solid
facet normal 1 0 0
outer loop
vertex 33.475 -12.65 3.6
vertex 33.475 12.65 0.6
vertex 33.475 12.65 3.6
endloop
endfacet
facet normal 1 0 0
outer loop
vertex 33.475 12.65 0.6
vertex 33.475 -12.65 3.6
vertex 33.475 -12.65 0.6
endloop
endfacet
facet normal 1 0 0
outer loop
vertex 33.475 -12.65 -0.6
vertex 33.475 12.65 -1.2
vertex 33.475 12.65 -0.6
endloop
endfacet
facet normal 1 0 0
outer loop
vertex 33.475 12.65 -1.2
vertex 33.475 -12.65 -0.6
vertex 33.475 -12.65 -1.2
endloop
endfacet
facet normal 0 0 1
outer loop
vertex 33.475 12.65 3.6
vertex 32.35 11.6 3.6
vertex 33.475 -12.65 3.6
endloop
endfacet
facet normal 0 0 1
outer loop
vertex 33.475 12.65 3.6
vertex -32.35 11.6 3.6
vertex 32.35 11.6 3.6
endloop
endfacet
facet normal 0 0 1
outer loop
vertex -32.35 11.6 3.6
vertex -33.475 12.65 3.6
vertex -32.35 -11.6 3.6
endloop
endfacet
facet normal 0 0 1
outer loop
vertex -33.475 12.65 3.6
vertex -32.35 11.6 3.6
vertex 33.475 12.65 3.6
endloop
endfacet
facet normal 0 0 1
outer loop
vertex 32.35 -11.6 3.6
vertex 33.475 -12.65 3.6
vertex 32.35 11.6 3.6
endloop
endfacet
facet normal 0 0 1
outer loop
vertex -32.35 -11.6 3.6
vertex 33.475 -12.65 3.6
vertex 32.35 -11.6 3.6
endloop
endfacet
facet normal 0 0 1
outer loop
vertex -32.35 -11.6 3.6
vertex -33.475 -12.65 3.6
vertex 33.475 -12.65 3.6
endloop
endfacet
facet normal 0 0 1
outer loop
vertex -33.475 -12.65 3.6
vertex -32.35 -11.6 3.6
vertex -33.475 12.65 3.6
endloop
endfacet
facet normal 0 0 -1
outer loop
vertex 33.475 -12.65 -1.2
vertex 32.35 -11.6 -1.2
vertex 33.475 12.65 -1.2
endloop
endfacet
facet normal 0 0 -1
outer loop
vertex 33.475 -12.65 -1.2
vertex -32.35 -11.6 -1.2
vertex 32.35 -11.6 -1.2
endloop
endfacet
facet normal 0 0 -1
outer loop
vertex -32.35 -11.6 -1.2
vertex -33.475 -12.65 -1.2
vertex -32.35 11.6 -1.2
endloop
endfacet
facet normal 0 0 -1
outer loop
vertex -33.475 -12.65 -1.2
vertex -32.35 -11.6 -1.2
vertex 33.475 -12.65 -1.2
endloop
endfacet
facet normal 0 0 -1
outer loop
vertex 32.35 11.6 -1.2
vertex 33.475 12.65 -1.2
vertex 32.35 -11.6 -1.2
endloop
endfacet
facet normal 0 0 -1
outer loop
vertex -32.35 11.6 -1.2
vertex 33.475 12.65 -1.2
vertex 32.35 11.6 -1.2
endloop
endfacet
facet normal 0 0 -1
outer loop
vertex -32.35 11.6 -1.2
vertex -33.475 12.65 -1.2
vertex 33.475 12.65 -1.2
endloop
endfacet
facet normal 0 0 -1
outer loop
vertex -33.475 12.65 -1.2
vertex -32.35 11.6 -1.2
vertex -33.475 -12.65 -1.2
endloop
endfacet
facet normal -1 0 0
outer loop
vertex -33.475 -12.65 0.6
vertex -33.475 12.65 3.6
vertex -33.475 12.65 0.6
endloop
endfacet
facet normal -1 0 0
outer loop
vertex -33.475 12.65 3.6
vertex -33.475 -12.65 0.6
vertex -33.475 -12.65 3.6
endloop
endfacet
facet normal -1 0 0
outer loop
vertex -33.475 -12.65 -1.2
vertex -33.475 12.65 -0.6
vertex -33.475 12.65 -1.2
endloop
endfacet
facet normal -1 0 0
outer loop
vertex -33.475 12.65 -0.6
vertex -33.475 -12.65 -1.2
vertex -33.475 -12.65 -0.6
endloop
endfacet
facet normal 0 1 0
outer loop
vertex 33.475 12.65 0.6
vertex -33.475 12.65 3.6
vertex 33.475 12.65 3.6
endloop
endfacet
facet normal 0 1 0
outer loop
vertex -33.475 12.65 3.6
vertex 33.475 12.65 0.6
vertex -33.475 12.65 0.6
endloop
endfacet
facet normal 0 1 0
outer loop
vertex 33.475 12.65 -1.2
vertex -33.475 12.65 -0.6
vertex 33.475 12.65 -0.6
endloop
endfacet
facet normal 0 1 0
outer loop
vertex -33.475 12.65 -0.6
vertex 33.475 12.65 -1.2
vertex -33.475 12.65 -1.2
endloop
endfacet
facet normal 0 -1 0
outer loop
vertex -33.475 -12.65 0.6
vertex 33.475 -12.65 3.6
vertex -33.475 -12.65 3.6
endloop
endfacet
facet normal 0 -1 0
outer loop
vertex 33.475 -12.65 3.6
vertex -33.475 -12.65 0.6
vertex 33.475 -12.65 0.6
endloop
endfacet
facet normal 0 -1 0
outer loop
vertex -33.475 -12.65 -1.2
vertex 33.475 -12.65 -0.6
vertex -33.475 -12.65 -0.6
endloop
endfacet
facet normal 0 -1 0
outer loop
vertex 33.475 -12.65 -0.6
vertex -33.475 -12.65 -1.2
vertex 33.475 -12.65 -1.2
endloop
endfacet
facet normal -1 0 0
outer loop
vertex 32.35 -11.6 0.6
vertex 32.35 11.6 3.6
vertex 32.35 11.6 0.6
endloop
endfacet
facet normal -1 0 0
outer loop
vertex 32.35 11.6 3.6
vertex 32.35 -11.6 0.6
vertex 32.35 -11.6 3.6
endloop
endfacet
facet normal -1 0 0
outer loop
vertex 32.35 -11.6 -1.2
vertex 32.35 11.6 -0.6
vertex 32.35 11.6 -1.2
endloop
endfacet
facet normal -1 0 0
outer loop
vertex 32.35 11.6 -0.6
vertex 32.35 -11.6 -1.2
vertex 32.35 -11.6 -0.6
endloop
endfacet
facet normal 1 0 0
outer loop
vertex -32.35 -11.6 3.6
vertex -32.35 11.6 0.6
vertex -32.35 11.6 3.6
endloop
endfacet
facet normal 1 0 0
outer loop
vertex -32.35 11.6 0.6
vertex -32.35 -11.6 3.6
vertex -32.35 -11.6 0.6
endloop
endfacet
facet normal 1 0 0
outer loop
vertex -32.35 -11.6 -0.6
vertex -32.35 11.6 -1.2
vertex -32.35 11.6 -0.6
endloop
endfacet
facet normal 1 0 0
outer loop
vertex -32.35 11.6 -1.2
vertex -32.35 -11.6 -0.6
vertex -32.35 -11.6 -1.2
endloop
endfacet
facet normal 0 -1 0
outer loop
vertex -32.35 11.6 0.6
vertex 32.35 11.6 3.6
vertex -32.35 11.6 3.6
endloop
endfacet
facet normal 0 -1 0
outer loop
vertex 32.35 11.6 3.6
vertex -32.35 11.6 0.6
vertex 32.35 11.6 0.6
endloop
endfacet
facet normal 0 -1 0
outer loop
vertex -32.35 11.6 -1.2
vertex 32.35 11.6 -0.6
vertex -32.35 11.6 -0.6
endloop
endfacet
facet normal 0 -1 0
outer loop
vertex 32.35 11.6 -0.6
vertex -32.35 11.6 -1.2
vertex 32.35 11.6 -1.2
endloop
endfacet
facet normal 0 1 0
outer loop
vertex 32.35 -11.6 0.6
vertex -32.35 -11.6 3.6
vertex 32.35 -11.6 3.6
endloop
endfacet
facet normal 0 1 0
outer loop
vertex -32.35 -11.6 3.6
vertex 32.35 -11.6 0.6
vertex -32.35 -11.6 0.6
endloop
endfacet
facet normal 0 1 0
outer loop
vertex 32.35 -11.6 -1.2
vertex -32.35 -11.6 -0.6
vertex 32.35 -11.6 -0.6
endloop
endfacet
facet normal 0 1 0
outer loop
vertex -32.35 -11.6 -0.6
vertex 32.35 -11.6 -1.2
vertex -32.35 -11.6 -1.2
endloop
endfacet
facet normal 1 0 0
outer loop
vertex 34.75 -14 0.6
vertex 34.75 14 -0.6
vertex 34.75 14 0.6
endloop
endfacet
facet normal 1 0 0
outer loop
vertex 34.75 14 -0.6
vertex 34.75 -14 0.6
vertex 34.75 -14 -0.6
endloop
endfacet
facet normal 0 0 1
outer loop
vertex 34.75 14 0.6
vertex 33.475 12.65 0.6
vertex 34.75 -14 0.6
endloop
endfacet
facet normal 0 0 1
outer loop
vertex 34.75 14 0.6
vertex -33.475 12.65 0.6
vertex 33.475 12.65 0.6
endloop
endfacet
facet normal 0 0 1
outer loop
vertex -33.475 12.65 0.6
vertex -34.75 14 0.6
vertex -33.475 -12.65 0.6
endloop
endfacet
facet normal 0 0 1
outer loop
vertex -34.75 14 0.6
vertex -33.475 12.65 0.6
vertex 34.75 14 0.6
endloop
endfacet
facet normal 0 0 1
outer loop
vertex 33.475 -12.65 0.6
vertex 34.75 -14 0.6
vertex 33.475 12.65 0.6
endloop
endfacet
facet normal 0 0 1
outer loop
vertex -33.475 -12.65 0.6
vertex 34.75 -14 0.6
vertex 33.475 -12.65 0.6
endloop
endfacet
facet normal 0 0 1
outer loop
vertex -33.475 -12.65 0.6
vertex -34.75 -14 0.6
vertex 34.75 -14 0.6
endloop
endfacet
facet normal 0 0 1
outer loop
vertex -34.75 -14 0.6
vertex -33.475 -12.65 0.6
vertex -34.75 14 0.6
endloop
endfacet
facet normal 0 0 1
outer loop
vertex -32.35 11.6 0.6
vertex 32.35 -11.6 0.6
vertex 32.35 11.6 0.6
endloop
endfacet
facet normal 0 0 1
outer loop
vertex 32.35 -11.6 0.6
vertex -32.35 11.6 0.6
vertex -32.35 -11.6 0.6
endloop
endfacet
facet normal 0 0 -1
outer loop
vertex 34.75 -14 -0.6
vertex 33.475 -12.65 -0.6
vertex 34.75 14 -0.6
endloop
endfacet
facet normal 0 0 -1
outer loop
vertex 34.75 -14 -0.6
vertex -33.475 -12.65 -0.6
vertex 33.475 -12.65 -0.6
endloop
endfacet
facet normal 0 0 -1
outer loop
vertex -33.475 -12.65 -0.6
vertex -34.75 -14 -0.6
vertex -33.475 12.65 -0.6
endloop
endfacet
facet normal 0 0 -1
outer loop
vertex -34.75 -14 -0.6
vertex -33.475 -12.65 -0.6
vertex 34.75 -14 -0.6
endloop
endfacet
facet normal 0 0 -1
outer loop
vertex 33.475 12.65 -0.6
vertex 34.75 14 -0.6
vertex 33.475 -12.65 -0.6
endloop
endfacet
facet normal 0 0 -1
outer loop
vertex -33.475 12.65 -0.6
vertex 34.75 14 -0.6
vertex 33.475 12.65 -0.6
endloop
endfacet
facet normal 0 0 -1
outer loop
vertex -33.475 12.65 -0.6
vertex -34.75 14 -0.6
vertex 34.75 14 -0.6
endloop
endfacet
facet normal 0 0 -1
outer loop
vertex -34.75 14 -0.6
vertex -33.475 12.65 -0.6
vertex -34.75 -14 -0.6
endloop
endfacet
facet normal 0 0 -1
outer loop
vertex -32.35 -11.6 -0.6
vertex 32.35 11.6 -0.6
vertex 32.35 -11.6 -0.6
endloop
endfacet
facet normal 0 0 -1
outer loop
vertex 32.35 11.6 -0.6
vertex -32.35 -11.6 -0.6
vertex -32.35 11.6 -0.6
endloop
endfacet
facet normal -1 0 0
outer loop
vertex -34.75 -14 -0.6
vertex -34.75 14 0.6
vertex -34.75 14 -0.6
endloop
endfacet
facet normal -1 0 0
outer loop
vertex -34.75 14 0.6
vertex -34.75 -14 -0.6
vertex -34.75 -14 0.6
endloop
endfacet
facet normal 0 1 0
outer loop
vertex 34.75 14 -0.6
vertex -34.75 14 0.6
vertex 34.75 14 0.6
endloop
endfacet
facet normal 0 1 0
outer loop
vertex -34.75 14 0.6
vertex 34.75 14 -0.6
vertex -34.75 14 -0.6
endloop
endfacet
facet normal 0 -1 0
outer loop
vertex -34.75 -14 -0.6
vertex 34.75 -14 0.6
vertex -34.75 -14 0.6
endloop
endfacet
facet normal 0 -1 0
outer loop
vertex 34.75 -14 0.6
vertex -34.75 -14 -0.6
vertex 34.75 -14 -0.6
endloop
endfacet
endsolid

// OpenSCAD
cover=true;
frameOnly=false;
l=50.8;
w=25.3;
h=19;
Rbh=4.5; //relay bottom desk height with pins of pins
t=1.2; //wall thickness
FBroom=8; //front/back room for cable

c=0.15; // clearance
lFull=l+2*FBroom; 
helpers=false;
2t=2*t;
2c=2*c;
2tc=2*(t+c);
tc=t+c;

if (!cover)
{
    frame();
    if (!frameOnly)
        walls();
}
else if (!frameOnly)
    cover();
    

if (helpers)
    relayBottom();

module walls()
{
    h=h+3*t;
    difference()
    {
        translate([0,0,h/2])

            cube([lFull+2tc,w+2tc,h],true);
        translate([0,0,h/2])
            cube([lFull+c,w+c,h],true);
        translate([0,0,3*t+Rbh])
            wallHoles();

    }
}

module cover()
{
    cube([lFull+2tc,w+2tc,t],true);
    difference(){
        translate([0,0,t])
            cube([lFull+c,w,4*t],true);
        translate([0,0,t])
            cube([lFull+2c-2t,2c+w-2t,4*t],true);
    }
}

module wallHoles()
{
    Hw=w/3;
    Hh=h/3;
    hx=h-Rbh;
    a=sin(45)*hx;
    translate ([0,0,Hh/2])
        cube([lFull+2tc,Hw,Hh],true);
    o=(lFull%a)/2;
    for (i=[0:floor(lFull/a)-1])
    {
        translate([(lFull+2tc)/2-a/2-t-i*a-o,0,(h+2t-a)/2])
            rotate([0,45,0])
            cube([t,w+2tc,hx],true);
    }
}
module frame()
{
    /*bottom plate*/
    difference()
    {
        fh=t+Rbh; // frame height
        translate([0,0,fh/2])
            cube([lFull+2tc,w+2tc,fh],true);
        translate([0,0,Rbh/2+t])
            cube([l+2c,w+2c,Rbh],true);
    }
}


module relayBottom()
{
    translate([0,0,Rbh/2])
        cube([l,w,Rbh],center=true);
}
